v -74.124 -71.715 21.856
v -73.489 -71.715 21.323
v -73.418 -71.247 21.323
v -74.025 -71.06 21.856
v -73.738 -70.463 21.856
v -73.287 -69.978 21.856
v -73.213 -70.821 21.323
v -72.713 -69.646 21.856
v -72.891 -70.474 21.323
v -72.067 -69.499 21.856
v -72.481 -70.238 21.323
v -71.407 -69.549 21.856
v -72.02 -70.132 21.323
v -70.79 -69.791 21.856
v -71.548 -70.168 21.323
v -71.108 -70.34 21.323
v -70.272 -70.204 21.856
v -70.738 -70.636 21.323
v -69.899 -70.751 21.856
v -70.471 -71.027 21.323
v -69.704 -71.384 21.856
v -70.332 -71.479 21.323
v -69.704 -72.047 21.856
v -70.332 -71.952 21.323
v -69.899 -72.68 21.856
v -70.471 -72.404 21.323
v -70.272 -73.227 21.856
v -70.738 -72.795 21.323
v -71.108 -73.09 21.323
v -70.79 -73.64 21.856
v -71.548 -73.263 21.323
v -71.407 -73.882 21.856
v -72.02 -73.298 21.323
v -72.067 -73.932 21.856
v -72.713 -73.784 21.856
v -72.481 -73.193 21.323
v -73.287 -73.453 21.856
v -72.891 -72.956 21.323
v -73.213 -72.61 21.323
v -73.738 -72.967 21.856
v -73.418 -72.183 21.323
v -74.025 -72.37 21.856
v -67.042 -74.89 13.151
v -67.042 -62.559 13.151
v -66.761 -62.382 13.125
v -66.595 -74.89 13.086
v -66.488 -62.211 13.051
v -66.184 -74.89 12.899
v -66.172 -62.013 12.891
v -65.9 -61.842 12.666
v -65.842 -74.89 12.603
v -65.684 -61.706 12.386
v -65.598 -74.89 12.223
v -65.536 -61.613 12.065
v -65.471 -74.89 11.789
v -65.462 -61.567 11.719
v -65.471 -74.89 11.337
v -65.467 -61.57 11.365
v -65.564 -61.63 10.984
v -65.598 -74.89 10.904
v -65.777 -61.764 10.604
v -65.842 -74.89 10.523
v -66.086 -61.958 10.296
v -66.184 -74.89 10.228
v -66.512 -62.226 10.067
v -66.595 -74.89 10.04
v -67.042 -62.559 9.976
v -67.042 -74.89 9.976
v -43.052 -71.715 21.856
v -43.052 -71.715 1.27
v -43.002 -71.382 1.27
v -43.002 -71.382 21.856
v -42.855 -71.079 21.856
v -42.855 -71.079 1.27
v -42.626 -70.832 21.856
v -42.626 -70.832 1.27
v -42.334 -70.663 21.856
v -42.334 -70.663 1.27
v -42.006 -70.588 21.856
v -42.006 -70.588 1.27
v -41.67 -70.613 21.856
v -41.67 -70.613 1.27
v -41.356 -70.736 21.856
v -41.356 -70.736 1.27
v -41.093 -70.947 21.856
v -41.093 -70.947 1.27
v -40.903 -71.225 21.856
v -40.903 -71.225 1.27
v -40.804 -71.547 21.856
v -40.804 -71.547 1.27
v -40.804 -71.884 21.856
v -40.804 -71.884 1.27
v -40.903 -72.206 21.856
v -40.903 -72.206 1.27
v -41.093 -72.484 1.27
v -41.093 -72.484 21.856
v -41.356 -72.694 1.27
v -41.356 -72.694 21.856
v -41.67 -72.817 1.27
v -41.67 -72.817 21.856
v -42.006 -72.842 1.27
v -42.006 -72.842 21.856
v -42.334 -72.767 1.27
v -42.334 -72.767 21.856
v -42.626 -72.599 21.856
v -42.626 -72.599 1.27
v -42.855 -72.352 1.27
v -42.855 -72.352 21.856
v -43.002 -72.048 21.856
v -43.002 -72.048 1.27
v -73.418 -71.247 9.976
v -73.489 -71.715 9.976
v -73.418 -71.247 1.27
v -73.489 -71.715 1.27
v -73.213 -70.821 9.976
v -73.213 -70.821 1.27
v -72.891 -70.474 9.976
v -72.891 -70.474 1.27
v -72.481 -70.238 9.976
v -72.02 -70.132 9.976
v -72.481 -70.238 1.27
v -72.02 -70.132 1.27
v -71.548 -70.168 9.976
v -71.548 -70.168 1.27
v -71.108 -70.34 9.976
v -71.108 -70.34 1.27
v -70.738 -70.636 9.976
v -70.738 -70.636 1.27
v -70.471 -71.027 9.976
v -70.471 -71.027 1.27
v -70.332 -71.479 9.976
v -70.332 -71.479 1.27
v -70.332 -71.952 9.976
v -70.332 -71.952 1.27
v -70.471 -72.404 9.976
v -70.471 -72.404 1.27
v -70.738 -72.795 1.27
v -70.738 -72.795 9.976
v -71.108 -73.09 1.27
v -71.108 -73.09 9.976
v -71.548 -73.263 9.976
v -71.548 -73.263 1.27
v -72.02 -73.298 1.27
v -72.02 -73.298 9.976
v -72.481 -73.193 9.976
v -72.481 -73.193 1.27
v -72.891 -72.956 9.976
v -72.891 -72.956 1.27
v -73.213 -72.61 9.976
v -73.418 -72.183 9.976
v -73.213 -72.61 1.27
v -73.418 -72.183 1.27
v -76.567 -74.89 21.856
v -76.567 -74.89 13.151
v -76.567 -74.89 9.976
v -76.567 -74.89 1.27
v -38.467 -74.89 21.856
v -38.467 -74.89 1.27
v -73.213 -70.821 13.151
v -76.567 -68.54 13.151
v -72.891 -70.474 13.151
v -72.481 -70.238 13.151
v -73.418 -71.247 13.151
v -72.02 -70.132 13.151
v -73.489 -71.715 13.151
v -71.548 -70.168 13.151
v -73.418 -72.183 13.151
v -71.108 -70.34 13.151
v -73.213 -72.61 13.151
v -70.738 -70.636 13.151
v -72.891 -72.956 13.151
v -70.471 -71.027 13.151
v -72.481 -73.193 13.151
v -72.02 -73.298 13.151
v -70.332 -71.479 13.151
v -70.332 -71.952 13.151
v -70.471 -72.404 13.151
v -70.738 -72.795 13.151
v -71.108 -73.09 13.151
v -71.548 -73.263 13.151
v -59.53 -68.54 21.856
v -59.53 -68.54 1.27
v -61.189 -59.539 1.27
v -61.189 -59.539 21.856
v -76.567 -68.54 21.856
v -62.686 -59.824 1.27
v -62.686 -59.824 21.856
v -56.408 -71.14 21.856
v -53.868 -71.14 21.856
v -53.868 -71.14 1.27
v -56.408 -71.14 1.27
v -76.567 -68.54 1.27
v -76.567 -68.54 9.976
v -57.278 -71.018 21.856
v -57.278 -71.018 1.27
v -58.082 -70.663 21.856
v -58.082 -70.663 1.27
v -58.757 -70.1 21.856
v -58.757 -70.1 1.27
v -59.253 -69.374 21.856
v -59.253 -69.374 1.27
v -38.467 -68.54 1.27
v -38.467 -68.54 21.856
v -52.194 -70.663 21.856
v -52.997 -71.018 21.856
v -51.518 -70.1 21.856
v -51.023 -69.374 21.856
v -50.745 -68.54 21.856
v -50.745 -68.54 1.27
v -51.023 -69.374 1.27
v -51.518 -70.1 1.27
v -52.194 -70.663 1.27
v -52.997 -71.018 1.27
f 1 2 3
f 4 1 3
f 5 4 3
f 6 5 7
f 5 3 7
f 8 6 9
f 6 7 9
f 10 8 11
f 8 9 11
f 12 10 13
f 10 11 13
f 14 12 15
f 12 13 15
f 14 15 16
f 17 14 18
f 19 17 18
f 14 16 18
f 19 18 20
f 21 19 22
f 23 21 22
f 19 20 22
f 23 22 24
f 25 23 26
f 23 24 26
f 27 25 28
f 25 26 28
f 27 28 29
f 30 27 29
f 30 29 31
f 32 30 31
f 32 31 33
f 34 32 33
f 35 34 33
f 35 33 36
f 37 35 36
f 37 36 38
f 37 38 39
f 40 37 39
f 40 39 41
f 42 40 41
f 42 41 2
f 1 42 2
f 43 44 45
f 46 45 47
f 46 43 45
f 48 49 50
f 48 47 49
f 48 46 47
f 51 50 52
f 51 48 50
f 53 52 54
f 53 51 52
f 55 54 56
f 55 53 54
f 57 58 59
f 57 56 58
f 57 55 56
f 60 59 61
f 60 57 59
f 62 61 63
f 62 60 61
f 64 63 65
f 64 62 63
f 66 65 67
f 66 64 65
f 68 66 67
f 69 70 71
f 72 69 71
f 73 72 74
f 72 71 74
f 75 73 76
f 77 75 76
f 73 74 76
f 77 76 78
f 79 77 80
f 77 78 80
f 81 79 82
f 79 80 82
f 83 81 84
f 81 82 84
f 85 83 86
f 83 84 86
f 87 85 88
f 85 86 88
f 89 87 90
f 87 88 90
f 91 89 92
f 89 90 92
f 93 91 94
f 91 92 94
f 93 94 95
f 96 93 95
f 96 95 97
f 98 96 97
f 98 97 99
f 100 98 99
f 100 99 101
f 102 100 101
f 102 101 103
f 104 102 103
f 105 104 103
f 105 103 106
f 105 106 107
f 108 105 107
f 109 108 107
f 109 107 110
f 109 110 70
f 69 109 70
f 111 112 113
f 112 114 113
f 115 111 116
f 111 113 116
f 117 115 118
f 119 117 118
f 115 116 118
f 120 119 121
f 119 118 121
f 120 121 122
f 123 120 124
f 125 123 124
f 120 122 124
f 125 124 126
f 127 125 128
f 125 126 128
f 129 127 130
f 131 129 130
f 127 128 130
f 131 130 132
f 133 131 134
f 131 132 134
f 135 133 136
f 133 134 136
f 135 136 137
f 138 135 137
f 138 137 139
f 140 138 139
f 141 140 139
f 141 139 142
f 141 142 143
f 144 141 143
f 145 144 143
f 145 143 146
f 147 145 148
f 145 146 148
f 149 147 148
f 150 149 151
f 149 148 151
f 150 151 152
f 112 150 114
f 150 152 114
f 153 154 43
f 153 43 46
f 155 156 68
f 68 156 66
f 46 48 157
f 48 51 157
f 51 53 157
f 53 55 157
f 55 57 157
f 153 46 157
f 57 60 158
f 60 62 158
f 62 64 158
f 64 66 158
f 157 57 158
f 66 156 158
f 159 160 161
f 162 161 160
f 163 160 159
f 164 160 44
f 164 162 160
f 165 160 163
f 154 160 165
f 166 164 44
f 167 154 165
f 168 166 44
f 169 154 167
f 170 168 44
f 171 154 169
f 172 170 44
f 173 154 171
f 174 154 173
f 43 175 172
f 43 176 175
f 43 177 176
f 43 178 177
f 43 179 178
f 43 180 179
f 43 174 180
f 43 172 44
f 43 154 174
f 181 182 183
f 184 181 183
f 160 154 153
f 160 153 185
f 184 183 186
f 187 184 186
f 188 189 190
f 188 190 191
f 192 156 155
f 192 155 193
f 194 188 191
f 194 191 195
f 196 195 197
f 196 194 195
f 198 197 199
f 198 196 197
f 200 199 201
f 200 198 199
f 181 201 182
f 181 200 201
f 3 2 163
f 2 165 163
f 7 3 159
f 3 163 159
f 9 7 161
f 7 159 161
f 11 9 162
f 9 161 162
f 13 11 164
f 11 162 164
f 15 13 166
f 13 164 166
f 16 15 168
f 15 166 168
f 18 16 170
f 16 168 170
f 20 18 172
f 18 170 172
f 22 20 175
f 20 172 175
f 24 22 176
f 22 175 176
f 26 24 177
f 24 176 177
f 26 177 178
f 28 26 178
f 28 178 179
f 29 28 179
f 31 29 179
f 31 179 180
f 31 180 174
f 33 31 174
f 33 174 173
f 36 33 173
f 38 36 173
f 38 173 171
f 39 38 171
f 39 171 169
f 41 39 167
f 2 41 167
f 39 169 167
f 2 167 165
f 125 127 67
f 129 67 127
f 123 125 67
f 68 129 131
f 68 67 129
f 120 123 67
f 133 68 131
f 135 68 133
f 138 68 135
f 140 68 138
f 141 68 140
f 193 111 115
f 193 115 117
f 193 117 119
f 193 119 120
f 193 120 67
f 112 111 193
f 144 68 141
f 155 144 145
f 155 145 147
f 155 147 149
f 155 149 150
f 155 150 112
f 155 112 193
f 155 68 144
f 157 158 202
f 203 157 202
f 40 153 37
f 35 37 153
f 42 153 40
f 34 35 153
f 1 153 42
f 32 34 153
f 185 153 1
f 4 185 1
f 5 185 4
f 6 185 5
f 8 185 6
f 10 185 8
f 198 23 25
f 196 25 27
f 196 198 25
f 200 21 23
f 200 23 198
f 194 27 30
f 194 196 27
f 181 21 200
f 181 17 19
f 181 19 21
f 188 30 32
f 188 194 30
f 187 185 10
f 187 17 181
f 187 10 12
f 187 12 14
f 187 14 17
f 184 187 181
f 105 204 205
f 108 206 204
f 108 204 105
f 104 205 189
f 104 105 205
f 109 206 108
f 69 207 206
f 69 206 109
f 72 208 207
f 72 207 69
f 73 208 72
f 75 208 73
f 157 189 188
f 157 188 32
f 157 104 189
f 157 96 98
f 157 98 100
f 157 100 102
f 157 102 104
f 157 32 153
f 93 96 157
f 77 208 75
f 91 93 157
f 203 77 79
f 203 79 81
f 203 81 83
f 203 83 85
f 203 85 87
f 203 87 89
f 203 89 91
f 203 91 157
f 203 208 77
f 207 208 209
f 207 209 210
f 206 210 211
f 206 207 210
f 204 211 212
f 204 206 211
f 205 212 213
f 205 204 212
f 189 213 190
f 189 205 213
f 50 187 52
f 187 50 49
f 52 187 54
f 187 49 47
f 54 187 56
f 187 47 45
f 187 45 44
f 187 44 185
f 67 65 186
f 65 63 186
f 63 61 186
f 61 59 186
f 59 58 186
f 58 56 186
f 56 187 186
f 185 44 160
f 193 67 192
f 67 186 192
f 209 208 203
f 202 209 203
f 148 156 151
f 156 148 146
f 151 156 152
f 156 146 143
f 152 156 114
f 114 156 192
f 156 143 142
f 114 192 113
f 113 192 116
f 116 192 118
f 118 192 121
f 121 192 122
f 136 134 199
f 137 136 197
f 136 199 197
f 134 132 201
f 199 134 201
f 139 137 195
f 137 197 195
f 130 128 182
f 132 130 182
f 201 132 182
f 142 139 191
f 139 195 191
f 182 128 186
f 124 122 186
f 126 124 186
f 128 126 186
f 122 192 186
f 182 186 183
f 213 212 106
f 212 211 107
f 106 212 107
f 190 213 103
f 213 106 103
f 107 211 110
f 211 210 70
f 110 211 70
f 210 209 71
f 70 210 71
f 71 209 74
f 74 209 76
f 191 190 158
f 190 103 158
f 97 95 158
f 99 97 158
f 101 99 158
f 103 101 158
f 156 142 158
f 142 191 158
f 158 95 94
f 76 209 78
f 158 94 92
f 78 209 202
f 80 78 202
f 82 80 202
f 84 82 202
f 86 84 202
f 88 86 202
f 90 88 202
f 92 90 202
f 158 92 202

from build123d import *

# Parameters (mm, degrees)
BOSS_EXTRUDE1_START                    = 1.27
SKETCH1_W                              = 38.1
SKETCH1_H                              = 6.35
BOSS_EXTRUDE1_DEPTH                    = 20.586143
CUT_EXTRUDE1_DEPTH                     = 16.351018574
F_1_8_0_125_DIAMETER_HOLE1_D           = 3.175
F_1_8_0_125_DIAMETER_HOLE1_CSINK_D     = 4.445
F_1_8_0_125_DIAMETER_HOLE1_CSINK_ANGLE = 100
F_4_40_TAPPED_HOLE1_D                  = 2.2606
CUT_EXTRUDE2_DEPTH                     = 21.586143296


with BuildPart() as part:
    # Sketch1 → Boss-Extrude1 (new body)
    with BuildSketch(Plane.XY.offset(BOSS_EXTRUDE1_START)):
        with Locations((-57.517034371, -71.715312393)):
            Rectangle(SKETCH1_W, SKETCH1_H)
        Polygon((-62.686491947, -59.823500591), (-76.567034371, -68.540312393), (-59.530062968, -68.540312393), (-61.189226937, -59.539293818), align=None)
        Polygon((-59.530062968, -68.540312393), (-76.567034371, -68.540312393), (-76.567034371, -74.890312393), (-38.467034371, -74.890312393), (-38.467034371, -68.540312393), align=None)
    extrude(amount=BOSS_EXTRUDE1_DEPTH)

    # Sketch2 → Cut-Extrude1 (cut, through all)
    with BuildSketch(Plane(origin=(26.553910442, -74.890312393, 0), x_dir=(1, 0, 0), z_dir=(0, 1, 0))):
        with BuildLine():
            Line((-103.120944813, -13.150571648), (-93.595944813, -13.150571648))
            ThreePointArc((-93.595944813, -13.150571648), (-92.008444813, -11.563071648), (-93.595944813, -9.975571648))
            Line((-93.595944813, -9.975571648), (-103.120944813, -9.975571648))
            ThreePointArc((-103.120944813, -9.975571648), (-104.708444813, -11.563071648), (-103.120944813, -13.150571648))
        make_face()
    extrude(amount=CUT_EXTRUDE1_DEPTH, mode=Mode.SUBTRACT)

    # 1/8 (0.125) Diameter Hole1 (through all)
    with Locations(Plane.XY.offset(21.856143296)):
        with Locations((-71.901359776, -71.715312393)):
            CounterSinkHole(F_1_8_0_125_DIAMETER_HOLE1_D / 2, F_1_8_0_125_DIAMETER_HOLE1_CSINK_D / 2, counter_sink_angle=F_1_8_0_125_DIAMETER_HOLE1_CSINK_ANGLE)

    # #4-40 Tapped Hole1 (through all)
    with Locations(Plane.XY.offset(21.856143296)):
        with Locations((-41.921434371, -71.715312393)):
            Hole(F_4_40_TAPPED_HOLE1_D / 2)

    # Sketch7 → Cut-Extrude2 (cut, through all)
    with BuildSketch(Plane.XY.offset(21.856143296)):
        with BuildLine():
            Line((-53.867665963, -71.139758797), (-56.407665963, -71.139758797))
            ThreePointArc((-56.407665963, -71.139758797), (-59.582665963, -67.964758797), (-56.407665963, -64.789758797))
            Line((-56.407665963, -64.789758797), (-53.867665963, -64.789758797))
            ThreePointArc((-53.867665963, -64.789758797), (-50.692665963, -67.964758797), (-53.867665963, -71.139758797))
        make_face()
    extrude(amount=-CUT_EXTRUDE2_DEPTH, mode=Mode.SUBTRACT)


solid = part.part
